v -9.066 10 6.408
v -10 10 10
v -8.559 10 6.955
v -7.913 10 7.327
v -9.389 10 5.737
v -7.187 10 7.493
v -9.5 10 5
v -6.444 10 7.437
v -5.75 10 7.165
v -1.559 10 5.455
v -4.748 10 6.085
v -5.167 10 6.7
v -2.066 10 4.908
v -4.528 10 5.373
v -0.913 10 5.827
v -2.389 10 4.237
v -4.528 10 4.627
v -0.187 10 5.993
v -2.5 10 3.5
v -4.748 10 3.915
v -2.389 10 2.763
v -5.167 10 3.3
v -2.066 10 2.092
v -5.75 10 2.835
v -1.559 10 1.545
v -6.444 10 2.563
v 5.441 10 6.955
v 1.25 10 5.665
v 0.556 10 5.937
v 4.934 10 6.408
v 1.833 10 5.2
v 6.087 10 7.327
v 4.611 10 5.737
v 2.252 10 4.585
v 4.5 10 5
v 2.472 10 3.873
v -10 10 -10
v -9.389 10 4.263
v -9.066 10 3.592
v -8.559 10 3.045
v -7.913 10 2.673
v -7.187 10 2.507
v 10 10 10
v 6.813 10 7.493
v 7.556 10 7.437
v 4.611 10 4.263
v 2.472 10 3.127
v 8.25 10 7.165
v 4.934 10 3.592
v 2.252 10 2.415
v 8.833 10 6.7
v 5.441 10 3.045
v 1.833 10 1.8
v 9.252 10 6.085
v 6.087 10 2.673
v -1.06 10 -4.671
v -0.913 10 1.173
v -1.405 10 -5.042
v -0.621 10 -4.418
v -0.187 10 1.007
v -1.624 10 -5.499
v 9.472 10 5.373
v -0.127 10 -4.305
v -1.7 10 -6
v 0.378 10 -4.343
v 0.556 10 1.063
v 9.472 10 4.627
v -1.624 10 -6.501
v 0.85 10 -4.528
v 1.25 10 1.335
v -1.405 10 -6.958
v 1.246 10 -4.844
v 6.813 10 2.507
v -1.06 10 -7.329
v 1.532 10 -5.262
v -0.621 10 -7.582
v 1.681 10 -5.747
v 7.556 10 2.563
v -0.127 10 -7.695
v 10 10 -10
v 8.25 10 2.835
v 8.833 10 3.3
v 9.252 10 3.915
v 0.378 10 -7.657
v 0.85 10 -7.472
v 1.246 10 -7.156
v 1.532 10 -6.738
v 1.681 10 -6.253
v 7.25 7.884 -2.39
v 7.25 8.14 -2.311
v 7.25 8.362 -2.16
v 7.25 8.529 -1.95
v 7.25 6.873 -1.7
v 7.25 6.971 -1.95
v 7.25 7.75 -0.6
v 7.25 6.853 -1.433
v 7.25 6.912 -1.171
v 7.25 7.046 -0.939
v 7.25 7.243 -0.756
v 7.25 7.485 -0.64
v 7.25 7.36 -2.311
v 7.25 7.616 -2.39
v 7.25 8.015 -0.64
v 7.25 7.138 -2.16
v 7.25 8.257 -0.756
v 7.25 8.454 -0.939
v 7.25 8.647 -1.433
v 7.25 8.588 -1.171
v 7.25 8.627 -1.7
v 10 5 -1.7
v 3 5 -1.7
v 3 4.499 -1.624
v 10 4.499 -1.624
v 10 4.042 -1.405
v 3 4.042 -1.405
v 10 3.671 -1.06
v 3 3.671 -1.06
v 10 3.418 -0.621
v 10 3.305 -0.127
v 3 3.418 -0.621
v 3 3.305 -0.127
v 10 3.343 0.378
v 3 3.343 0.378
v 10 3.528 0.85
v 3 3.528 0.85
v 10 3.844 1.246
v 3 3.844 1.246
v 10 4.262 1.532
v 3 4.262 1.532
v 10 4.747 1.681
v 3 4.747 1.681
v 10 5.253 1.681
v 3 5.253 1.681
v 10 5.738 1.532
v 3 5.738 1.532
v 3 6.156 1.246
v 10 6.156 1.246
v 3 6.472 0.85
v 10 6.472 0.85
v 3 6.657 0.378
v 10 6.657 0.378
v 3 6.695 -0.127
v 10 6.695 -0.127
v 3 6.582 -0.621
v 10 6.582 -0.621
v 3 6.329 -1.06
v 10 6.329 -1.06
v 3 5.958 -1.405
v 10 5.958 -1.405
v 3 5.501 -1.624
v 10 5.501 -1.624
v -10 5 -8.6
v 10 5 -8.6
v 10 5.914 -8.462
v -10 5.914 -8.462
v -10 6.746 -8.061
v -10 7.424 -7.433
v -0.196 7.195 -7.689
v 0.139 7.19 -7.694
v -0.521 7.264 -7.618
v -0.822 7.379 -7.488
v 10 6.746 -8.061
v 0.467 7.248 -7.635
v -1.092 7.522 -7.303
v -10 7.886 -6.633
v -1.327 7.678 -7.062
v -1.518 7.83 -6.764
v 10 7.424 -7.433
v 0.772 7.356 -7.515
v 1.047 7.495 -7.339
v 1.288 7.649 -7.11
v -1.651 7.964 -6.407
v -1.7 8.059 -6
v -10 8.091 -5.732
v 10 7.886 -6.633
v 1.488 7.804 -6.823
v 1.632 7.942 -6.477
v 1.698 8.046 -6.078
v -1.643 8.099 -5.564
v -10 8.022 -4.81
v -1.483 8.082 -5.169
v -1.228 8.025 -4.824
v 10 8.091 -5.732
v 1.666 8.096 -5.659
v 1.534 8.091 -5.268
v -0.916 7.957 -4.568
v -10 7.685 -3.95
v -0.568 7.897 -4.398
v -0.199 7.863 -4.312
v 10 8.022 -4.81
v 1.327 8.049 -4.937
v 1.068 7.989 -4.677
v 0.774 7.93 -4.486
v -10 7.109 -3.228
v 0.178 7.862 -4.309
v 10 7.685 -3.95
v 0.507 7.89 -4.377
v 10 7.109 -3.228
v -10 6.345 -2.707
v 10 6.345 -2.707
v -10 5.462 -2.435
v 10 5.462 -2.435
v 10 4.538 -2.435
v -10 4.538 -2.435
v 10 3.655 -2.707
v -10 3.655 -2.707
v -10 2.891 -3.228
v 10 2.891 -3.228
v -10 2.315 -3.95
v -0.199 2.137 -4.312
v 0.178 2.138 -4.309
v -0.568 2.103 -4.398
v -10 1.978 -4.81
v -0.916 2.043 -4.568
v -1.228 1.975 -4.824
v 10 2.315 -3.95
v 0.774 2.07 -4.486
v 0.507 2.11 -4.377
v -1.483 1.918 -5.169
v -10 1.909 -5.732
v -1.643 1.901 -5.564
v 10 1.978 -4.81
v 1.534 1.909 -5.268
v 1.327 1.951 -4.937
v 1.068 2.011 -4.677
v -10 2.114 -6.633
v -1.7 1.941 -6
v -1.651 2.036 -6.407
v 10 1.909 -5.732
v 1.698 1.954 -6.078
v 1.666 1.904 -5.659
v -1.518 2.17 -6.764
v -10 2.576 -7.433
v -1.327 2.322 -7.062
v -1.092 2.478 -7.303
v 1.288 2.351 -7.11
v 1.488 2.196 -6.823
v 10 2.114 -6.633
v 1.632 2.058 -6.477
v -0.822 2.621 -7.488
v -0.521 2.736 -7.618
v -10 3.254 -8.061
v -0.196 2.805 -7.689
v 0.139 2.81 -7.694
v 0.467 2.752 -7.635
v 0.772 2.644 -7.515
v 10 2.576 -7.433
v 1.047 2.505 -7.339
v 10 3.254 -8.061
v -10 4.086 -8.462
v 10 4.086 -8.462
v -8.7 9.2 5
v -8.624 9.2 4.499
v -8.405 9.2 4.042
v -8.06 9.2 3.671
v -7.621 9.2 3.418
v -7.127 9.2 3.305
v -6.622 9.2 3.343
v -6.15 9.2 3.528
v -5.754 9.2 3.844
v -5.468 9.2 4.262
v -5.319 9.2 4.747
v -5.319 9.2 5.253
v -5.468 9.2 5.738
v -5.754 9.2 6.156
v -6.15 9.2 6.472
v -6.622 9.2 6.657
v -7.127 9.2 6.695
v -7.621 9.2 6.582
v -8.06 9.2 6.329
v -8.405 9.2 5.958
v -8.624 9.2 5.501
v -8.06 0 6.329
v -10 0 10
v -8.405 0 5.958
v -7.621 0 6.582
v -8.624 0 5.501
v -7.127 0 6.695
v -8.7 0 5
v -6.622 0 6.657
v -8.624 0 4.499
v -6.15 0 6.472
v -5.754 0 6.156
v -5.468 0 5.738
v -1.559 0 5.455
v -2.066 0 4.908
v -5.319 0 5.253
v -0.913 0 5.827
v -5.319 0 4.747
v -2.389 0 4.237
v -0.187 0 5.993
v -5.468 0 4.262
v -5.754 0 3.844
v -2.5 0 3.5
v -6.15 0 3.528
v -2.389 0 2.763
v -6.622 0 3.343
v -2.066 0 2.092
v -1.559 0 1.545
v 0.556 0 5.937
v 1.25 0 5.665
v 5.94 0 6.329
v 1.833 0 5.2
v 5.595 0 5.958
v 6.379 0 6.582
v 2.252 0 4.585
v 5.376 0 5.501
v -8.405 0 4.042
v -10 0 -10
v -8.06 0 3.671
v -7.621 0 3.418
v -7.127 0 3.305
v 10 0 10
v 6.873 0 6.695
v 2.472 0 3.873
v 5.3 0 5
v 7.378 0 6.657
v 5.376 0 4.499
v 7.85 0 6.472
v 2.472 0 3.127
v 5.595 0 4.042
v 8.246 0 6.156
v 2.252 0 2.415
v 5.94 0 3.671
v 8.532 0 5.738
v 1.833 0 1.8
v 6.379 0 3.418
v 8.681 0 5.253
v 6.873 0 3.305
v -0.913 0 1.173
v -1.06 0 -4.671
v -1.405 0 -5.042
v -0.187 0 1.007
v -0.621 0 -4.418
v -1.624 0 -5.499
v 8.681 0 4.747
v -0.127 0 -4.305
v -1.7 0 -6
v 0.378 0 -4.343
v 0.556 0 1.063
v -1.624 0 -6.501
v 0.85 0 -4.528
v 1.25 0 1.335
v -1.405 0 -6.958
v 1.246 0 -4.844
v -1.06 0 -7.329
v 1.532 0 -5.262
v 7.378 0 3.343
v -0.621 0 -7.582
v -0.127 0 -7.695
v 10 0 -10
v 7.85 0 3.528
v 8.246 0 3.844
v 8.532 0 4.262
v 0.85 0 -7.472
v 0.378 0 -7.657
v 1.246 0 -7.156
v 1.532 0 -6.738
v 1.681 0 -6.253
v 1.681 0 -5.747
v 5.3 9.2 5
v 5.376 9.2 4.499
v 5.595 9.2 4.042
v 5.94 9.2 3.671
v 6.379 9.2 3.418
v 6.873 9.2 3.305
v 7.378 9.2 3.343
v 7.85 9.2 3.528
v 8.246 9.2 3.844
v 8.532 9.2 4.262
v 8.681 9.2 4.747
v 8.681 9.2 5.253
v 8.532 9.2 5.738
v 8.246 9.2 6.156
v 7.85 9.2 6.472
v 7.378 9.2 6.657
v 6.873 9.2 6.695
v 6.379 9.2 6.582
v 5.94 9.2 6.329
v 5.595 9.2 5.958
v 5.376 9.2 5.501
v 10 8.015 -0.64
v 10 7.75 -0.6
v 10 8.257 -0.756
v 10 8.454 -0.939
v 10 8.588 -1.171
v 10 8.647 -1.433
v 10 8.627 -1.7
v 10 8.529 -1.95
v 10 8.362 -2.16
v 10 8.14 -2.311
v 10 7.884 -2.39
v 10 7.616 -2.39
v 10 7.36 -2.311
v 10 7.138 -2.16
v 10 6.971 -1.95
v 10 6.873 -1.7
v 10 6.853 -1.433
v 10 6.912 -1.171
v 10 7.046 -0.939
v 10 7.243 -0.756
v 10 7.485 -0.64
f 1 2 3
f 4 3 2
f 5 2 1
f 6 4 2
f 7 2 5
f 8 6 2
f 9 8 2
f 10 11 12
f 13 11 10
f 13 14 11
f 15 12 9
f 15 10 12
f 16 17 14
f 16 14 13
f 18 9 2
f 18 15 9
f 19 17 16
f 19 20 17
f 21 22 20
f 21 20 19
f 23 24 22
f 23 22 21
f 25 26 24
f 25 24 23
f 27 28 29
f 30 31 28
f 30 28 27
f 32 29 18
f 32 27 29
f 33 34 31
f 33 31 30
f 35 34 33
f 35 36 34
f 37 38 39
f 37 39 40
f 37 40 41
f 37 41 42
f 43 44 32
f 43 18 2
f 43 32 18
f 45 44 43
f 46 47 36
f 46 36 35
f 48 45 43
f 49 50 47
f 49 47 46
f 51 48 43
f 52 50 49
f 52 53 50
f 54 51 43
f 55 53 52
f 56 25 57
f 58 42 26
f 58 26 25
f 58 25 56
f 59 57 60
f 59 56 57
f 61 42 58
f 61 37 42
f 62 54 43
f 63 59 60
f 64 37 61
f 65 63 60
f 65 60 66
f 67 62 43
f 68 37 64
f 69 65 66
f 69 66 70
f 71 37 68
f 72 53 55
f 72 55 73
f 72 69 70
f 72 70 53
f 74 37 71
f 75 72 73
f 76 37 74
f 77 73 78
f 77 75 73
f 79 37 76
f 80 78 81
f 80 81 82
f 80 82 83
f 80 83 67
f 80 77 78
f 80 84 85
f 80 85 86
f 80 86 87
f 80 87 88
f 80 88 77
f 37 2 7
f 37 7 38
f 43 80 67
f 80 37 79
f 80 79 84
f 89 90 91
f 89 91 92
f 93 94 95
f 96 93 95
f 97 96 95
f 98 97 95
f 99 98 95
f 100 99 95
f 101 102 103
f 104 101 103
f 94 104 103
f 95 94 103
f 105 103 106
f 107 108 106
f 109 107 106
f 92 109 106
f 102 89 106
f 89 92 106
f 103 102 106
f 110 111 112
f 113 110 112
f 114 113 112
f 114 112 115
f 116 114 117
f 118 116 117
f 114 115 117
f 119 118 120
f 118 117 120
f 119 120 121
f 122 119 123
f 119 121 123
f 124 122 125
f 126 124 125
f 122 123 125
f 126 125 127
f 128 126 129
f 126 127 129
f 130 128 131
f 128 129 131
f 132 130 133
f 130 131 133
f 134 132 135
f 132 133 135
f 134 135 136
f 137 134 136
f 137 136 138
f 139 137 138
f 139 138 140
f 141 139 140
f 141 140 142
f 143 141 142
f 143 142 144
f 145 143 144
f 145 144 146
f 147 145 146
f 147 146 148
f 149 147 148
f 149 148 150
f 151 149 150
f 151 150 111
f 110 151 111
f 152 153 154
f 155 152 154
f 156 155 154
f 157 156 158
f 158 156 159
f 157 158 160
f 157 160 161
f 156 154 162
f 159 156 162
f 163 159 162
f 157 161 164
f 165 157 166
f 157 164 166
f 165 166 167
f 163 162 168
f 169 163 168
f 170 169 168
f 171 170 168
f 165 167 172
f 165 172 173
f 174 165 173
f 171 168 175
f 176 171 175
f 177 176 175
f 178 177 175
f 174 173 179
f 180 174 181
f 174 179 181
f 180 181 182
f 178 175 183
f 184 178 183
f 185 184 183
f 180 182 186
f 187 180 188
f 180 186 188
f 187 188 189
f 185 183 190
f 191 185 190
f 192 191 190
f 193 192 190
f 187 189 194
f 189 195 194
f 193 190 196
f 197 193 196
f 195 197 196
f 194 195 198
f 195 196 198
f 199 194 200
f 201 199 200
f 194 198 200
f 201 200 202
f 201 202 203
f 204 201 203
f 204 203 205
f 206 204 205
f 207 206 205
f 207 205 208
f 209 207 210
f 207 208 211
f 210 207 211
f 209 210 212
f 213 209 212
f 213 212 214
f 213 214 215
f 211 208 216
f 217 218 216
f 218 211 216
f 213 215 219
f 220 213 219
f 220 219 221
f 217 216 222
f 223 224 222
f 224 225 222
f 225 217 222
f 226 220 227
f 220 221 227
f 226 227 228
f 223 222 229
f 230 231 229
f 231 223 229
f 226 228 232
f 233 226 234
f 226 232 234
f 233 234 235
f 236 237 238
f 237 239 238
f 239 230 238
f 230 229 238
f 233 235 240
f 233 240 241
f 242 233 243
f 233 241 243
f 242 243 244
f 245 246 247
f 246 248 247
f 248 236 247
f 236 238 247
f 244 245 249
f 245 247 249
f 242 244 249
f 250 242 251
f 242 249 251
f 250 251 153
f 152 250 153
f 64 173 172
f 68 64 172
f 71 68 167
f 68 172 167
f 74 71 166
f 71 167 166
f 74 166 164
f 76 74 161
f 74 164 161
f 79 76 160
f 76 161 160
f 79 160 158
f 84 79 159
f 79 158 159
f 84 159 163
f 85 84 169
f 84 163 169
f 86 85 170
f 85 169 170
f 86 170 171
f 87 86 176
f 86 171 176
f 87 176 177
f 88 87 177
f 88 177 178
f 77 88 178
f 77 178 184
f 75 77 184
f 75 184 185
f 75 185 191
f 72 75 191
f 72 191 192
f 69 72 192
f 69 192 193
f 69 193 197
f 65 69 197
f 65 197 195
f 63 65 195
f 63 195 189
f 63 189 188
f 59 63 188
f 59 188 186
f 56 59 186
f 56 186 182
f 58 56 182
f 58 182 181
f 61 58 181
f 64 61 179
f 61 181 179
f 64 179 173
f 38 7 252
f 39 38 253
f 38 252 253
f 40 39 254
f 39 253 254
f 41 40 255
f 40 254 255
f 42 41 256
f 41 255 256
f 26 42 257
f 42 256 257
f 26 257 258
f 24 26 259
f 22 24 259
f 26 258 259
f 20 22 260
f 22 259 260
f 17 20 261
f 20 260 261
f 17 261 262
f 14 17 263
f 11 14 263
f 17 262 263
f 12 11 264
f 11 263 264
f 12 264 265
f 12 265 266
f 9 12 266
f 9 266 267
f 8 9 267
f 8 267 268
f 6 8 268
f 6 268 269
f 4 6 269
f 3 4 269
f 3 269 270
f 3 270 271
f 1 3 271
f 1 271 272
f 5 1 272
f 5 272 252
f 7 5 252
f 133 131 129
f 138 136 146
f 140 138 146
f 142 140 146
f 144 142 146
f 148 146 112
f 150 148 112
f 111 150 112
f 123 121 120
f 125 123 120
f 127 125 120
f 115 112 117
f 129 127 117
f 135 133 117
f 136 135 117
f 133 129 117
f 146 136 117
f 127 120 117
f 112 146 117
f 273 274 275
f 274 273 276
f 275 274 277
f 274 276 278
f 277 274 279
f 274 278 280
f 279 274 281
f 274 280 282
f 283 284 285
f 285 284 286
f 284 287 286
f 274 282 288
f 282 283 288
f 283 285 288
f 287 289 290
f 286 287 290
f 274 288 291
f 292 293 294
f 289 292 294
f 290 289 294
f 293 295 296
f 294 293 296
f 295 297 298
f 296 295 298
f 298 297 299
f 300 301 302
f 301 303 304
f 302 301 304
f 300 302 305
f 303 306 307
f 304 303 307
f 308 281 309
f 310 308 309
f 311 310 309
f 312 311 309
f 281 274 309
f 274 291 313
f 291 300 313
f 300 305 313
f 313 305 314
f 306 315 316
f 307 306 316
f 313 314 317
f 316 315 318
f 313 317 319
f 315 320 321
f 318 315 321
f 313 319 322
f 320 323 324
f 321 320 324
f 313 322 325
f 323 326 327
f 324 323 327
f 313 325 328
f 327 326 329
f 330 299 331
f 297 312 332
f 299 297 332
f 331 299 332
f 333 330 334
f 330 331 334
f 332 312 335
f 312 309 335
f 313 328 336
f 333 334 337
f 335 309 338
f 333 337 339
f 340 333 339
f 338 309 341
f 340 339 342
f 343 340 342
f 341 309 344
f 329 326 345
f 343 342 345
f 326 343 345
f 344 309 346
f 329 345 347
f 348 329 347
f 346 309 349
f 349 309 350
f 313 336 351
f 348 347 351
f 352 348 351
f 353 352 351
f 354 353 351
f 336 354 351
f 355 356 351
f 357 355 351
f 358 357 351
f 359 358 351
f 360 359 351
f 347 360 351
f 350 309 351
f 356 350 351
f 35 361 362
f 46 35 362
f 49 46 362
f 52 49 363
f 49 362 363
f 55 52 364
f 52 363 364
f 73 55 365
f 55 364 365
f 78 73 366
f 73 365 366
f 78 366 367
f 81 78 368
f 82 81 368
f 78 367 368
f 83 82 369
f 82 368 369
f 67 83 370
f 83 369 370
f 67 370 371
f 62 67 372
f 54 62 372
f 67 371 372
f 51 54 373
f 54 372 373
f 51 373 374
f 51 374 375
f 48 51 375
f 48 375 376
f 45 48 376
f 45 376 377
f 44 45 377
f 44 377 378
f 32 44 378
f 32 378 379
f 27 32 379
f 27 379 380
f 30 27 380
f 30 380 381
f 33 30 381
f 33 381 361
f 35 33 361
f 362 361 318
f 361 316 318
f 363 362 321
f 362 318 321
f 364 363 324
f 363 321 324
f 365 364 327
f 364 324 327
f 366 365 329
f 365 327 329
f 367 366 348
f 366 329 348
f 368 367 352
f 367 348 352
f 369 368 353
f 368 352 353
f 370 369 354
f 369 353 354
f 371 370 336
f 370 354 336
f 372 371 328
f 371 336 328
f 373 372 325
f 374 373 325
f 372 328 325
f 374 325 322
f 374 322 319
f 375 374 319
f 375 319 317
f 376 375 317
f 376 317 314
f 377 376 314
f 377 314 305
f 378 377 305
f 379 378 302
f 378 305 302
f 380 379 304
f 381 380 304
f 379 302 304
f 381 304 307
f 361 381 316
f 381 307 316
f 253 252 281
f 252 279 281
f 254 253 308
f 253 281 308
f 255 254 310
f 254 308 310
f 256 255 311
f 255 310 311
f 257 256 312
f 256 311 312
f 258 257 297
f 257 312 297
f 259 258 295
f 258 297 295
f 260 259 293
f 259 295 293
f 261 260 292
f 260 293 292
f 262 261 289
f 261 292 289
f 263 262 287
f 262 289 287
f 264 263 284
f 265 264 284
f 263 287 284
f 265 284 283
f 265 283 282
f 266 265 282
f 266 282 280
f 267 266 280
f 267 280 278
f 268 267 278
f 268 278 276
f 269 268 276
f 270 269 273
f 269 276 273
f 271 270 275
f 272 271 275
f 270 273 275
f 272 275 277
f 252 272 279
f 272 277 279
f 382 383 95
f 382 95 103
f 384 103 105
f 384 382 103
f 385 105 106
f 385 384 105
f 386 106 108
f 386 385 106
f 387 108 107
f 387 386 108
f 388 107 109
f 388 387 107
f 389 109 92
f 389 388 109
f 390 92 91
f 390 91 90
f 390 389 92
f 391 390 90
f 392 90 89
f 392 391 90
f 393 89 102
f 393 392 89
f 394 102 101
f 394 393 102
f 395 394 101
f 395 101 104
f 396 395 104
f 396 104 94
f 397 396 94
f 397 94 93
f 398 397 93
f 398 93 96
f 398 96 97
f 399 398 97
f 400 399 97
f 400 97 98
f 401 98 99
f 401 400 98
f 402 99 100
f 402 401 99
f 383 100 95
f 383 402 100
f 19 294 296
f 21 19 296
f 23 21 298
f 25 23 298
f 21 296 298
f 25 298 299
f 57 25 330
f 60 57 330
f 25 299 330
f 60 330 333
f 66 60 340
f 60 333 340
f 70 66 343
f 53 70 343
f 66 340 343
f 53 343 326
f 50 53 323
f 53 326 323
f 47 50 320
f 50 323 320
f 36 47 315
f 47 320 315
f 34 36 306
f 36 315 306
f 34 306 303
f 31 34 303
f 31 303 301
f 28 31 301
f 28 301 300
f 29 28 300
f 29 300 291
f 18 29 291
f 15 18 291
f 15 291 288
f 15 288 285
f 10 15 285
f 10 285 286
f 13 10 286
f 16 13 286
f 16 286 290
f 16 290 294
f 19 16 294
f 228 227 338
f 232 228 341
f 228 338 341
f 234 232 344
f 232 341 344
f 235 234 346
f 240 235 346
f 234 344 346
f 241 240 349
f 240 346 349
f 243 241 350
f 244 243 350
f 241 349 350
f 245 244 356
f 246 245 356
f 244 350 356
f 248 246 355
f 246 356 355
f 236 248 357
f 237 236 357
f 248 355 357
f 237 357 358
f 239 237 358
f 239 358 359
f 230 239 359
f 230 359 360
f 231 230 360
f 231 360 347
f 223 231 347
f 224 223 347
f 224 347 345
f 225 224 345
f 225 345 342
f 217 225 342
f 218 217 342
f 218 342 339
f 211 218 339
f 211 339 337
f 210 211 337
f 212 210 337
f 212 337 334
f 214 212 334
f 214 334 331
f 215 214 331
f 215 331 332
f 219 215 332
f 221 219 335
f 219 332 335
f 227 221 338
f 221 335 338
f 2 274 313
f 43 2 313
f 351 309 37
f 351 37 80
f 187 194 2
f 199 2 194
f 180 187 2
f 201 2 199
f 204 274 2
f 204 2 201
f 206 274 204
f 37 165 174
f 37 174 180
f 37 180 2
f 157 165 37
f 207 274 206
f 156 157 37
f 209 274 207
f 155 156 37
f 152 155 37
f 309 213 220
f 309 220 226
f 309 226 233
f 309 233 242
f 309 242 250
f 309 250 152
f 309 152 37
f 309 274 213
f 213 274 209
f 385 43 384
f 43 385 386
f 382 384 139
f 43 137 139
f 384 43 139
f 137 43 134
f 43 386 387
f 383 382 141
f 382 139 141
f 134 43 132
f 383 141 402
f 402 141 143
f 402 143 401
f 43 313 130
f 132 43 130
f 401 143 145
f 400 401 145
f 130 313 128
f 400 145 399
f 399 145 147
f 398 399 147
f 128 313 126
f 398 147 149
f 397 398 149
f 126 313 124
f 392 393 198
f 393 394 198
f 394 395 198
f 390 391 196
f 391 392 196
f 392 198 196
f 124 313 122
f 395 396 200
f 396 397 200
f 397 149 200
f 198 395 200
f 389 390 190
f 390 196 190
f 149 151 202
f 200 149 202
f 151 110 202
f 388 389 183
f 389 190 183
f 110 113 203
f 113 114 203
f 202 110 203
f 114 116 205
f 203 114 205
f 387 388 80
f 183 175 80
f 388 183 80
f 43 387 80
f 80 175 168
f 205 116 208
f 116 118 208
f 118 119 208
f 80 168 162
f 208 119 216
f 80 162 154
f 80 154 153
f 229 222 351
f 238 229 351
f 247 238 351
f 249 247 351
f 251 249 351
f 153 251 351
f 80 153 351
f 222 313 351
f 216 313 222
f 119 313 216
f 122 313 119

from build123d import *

# Parameters (mm, degrees)
CROQUIS1_W                                           = 20
CROQUIS1_H                                           = 20
SALIENTE_EXTRUIR1_DEPTH                              = 10
PERFORADOR_PARA_ROSCAR_PARA_MACHO_DE_ROS_D           = 5
REFRENTADO_PARA_TORNILLO_TAP_N_CON_CABEZ_D           = 3.4
REFRENTADO_PARA_TORNILLO_TAP_N_CON_CABEZ_CSINK_D     = 5
REFRENTADO_PARA_TORNILLO_TAP_N_CON_CABEZ_CSINK_ANGLE = 90
TALADRO_DE_MARGEN_PARA_M31_D                         = 3.4
CROQUIS17_R                                          = 3.1
CORTAR_EXTRUIR1_DEPTH                                = 20
TALADRO_DE_MARGEN_PARA_M32_D                         = 3.4
TALADRO_DE_MARGEN_PARA_M32_DEPTH                     = 7
CROQUIS21_R                                          = 0.9
CORTAR_EXTRUIR2_DEPTH                                = 2.75


with BuildPart() as part:
    # Croquis1 → Saliente-Extruir1 (new body)
    with BuildSketch(Plane(origin=(0, 0, 0), x_dir=(1, 0, 0), z_dir=(0, 1, 0))):
        Rectangle(CROQUIS1_W, CROQUIS1_H)
    extrude(amount=SALIENTE_EXTRUIR1_DEPTH)

    # Perforador para roscar para macho de roscar para M6x1.01 (through all)
    with Locations(Plane(origin=(0, 10, 0), x_dir=(1, 0, 0), z_dir=(0, 1, 0))):
        with Locations((0, -3.5)):
            Hole(PERFORADOR_PARA_ROSCAR_PARA_MACHO_DE_ROS_D / 2)

    # Refrentado para tornillo tapón con cabeza plana de clavija de M31 (through all)
    with Locations(Plane(origin=(0, 10, 0), x_dir=(1, 0, 0), z_dir=(0, 1, 0))):
        with Locations((-7, -5), (7, -5)):
            CounterSinkHole(REFRENTADO_PARA_TORNILLO_TAP_N_CON_CABEZ_D / 2, REFRENTADO_PARA_TORNILLO_TAP_N_CON_CABEZ_CSINK_D / 2, counter_sink_angle=REFRENTADO_PARA_TORNILLO_TAP_N_CON_CABEZ_CSINK_ANGLE)

    # Taladro de margen para M31 (through all)
    with Locations(Plane(origin=(0, 10, 0), x_dir=(1, 0, 0), z_dir=(0, 1, 0))):
        with Locations((0, 6)):
            Hole(TALADRO_DE_MARGEN_PARA_M31_D / 2)

    # Croquis17 → Cortar-Extruir1 (cut)
    with BuildSketch(Plane(origin=(10, 0, 0), x_dir=(0, 0, -1), z_dir=(1, 0, 0))):
        with Locations((5.5, 5)):
            Circle(CROQUIS17_R)
    extrude(amount=-CORTAR_EXTRUIR1_DEPTH, mode=Mode.SUBTRACT)

    # Taladro de margen para M32
    with Locations(Plane(origin=(10, 0, 0), x_dir=(0, 0, 1), z_dir=(1, 0, 0))):
        with Locations((0, -5)):
            Hole(TALADRO_DE_MARGEN_PARA_M32_D / 2, depth=TALADRO_DE_MARGEN_PARA_M32_DEPTH)

    # Croquis21 → Cortar-Extruir2 (cut)
    with BuildSketch(Plane.ZY.offset(-10)):
        with Locations((-1.5, 7.75)):
            Circle(CROQUIS21_R)
    extrude(amount=CORTAR_EXTRUIR2_DEPTH, mode=Mode.SUBTRACT)


solid = part.part
